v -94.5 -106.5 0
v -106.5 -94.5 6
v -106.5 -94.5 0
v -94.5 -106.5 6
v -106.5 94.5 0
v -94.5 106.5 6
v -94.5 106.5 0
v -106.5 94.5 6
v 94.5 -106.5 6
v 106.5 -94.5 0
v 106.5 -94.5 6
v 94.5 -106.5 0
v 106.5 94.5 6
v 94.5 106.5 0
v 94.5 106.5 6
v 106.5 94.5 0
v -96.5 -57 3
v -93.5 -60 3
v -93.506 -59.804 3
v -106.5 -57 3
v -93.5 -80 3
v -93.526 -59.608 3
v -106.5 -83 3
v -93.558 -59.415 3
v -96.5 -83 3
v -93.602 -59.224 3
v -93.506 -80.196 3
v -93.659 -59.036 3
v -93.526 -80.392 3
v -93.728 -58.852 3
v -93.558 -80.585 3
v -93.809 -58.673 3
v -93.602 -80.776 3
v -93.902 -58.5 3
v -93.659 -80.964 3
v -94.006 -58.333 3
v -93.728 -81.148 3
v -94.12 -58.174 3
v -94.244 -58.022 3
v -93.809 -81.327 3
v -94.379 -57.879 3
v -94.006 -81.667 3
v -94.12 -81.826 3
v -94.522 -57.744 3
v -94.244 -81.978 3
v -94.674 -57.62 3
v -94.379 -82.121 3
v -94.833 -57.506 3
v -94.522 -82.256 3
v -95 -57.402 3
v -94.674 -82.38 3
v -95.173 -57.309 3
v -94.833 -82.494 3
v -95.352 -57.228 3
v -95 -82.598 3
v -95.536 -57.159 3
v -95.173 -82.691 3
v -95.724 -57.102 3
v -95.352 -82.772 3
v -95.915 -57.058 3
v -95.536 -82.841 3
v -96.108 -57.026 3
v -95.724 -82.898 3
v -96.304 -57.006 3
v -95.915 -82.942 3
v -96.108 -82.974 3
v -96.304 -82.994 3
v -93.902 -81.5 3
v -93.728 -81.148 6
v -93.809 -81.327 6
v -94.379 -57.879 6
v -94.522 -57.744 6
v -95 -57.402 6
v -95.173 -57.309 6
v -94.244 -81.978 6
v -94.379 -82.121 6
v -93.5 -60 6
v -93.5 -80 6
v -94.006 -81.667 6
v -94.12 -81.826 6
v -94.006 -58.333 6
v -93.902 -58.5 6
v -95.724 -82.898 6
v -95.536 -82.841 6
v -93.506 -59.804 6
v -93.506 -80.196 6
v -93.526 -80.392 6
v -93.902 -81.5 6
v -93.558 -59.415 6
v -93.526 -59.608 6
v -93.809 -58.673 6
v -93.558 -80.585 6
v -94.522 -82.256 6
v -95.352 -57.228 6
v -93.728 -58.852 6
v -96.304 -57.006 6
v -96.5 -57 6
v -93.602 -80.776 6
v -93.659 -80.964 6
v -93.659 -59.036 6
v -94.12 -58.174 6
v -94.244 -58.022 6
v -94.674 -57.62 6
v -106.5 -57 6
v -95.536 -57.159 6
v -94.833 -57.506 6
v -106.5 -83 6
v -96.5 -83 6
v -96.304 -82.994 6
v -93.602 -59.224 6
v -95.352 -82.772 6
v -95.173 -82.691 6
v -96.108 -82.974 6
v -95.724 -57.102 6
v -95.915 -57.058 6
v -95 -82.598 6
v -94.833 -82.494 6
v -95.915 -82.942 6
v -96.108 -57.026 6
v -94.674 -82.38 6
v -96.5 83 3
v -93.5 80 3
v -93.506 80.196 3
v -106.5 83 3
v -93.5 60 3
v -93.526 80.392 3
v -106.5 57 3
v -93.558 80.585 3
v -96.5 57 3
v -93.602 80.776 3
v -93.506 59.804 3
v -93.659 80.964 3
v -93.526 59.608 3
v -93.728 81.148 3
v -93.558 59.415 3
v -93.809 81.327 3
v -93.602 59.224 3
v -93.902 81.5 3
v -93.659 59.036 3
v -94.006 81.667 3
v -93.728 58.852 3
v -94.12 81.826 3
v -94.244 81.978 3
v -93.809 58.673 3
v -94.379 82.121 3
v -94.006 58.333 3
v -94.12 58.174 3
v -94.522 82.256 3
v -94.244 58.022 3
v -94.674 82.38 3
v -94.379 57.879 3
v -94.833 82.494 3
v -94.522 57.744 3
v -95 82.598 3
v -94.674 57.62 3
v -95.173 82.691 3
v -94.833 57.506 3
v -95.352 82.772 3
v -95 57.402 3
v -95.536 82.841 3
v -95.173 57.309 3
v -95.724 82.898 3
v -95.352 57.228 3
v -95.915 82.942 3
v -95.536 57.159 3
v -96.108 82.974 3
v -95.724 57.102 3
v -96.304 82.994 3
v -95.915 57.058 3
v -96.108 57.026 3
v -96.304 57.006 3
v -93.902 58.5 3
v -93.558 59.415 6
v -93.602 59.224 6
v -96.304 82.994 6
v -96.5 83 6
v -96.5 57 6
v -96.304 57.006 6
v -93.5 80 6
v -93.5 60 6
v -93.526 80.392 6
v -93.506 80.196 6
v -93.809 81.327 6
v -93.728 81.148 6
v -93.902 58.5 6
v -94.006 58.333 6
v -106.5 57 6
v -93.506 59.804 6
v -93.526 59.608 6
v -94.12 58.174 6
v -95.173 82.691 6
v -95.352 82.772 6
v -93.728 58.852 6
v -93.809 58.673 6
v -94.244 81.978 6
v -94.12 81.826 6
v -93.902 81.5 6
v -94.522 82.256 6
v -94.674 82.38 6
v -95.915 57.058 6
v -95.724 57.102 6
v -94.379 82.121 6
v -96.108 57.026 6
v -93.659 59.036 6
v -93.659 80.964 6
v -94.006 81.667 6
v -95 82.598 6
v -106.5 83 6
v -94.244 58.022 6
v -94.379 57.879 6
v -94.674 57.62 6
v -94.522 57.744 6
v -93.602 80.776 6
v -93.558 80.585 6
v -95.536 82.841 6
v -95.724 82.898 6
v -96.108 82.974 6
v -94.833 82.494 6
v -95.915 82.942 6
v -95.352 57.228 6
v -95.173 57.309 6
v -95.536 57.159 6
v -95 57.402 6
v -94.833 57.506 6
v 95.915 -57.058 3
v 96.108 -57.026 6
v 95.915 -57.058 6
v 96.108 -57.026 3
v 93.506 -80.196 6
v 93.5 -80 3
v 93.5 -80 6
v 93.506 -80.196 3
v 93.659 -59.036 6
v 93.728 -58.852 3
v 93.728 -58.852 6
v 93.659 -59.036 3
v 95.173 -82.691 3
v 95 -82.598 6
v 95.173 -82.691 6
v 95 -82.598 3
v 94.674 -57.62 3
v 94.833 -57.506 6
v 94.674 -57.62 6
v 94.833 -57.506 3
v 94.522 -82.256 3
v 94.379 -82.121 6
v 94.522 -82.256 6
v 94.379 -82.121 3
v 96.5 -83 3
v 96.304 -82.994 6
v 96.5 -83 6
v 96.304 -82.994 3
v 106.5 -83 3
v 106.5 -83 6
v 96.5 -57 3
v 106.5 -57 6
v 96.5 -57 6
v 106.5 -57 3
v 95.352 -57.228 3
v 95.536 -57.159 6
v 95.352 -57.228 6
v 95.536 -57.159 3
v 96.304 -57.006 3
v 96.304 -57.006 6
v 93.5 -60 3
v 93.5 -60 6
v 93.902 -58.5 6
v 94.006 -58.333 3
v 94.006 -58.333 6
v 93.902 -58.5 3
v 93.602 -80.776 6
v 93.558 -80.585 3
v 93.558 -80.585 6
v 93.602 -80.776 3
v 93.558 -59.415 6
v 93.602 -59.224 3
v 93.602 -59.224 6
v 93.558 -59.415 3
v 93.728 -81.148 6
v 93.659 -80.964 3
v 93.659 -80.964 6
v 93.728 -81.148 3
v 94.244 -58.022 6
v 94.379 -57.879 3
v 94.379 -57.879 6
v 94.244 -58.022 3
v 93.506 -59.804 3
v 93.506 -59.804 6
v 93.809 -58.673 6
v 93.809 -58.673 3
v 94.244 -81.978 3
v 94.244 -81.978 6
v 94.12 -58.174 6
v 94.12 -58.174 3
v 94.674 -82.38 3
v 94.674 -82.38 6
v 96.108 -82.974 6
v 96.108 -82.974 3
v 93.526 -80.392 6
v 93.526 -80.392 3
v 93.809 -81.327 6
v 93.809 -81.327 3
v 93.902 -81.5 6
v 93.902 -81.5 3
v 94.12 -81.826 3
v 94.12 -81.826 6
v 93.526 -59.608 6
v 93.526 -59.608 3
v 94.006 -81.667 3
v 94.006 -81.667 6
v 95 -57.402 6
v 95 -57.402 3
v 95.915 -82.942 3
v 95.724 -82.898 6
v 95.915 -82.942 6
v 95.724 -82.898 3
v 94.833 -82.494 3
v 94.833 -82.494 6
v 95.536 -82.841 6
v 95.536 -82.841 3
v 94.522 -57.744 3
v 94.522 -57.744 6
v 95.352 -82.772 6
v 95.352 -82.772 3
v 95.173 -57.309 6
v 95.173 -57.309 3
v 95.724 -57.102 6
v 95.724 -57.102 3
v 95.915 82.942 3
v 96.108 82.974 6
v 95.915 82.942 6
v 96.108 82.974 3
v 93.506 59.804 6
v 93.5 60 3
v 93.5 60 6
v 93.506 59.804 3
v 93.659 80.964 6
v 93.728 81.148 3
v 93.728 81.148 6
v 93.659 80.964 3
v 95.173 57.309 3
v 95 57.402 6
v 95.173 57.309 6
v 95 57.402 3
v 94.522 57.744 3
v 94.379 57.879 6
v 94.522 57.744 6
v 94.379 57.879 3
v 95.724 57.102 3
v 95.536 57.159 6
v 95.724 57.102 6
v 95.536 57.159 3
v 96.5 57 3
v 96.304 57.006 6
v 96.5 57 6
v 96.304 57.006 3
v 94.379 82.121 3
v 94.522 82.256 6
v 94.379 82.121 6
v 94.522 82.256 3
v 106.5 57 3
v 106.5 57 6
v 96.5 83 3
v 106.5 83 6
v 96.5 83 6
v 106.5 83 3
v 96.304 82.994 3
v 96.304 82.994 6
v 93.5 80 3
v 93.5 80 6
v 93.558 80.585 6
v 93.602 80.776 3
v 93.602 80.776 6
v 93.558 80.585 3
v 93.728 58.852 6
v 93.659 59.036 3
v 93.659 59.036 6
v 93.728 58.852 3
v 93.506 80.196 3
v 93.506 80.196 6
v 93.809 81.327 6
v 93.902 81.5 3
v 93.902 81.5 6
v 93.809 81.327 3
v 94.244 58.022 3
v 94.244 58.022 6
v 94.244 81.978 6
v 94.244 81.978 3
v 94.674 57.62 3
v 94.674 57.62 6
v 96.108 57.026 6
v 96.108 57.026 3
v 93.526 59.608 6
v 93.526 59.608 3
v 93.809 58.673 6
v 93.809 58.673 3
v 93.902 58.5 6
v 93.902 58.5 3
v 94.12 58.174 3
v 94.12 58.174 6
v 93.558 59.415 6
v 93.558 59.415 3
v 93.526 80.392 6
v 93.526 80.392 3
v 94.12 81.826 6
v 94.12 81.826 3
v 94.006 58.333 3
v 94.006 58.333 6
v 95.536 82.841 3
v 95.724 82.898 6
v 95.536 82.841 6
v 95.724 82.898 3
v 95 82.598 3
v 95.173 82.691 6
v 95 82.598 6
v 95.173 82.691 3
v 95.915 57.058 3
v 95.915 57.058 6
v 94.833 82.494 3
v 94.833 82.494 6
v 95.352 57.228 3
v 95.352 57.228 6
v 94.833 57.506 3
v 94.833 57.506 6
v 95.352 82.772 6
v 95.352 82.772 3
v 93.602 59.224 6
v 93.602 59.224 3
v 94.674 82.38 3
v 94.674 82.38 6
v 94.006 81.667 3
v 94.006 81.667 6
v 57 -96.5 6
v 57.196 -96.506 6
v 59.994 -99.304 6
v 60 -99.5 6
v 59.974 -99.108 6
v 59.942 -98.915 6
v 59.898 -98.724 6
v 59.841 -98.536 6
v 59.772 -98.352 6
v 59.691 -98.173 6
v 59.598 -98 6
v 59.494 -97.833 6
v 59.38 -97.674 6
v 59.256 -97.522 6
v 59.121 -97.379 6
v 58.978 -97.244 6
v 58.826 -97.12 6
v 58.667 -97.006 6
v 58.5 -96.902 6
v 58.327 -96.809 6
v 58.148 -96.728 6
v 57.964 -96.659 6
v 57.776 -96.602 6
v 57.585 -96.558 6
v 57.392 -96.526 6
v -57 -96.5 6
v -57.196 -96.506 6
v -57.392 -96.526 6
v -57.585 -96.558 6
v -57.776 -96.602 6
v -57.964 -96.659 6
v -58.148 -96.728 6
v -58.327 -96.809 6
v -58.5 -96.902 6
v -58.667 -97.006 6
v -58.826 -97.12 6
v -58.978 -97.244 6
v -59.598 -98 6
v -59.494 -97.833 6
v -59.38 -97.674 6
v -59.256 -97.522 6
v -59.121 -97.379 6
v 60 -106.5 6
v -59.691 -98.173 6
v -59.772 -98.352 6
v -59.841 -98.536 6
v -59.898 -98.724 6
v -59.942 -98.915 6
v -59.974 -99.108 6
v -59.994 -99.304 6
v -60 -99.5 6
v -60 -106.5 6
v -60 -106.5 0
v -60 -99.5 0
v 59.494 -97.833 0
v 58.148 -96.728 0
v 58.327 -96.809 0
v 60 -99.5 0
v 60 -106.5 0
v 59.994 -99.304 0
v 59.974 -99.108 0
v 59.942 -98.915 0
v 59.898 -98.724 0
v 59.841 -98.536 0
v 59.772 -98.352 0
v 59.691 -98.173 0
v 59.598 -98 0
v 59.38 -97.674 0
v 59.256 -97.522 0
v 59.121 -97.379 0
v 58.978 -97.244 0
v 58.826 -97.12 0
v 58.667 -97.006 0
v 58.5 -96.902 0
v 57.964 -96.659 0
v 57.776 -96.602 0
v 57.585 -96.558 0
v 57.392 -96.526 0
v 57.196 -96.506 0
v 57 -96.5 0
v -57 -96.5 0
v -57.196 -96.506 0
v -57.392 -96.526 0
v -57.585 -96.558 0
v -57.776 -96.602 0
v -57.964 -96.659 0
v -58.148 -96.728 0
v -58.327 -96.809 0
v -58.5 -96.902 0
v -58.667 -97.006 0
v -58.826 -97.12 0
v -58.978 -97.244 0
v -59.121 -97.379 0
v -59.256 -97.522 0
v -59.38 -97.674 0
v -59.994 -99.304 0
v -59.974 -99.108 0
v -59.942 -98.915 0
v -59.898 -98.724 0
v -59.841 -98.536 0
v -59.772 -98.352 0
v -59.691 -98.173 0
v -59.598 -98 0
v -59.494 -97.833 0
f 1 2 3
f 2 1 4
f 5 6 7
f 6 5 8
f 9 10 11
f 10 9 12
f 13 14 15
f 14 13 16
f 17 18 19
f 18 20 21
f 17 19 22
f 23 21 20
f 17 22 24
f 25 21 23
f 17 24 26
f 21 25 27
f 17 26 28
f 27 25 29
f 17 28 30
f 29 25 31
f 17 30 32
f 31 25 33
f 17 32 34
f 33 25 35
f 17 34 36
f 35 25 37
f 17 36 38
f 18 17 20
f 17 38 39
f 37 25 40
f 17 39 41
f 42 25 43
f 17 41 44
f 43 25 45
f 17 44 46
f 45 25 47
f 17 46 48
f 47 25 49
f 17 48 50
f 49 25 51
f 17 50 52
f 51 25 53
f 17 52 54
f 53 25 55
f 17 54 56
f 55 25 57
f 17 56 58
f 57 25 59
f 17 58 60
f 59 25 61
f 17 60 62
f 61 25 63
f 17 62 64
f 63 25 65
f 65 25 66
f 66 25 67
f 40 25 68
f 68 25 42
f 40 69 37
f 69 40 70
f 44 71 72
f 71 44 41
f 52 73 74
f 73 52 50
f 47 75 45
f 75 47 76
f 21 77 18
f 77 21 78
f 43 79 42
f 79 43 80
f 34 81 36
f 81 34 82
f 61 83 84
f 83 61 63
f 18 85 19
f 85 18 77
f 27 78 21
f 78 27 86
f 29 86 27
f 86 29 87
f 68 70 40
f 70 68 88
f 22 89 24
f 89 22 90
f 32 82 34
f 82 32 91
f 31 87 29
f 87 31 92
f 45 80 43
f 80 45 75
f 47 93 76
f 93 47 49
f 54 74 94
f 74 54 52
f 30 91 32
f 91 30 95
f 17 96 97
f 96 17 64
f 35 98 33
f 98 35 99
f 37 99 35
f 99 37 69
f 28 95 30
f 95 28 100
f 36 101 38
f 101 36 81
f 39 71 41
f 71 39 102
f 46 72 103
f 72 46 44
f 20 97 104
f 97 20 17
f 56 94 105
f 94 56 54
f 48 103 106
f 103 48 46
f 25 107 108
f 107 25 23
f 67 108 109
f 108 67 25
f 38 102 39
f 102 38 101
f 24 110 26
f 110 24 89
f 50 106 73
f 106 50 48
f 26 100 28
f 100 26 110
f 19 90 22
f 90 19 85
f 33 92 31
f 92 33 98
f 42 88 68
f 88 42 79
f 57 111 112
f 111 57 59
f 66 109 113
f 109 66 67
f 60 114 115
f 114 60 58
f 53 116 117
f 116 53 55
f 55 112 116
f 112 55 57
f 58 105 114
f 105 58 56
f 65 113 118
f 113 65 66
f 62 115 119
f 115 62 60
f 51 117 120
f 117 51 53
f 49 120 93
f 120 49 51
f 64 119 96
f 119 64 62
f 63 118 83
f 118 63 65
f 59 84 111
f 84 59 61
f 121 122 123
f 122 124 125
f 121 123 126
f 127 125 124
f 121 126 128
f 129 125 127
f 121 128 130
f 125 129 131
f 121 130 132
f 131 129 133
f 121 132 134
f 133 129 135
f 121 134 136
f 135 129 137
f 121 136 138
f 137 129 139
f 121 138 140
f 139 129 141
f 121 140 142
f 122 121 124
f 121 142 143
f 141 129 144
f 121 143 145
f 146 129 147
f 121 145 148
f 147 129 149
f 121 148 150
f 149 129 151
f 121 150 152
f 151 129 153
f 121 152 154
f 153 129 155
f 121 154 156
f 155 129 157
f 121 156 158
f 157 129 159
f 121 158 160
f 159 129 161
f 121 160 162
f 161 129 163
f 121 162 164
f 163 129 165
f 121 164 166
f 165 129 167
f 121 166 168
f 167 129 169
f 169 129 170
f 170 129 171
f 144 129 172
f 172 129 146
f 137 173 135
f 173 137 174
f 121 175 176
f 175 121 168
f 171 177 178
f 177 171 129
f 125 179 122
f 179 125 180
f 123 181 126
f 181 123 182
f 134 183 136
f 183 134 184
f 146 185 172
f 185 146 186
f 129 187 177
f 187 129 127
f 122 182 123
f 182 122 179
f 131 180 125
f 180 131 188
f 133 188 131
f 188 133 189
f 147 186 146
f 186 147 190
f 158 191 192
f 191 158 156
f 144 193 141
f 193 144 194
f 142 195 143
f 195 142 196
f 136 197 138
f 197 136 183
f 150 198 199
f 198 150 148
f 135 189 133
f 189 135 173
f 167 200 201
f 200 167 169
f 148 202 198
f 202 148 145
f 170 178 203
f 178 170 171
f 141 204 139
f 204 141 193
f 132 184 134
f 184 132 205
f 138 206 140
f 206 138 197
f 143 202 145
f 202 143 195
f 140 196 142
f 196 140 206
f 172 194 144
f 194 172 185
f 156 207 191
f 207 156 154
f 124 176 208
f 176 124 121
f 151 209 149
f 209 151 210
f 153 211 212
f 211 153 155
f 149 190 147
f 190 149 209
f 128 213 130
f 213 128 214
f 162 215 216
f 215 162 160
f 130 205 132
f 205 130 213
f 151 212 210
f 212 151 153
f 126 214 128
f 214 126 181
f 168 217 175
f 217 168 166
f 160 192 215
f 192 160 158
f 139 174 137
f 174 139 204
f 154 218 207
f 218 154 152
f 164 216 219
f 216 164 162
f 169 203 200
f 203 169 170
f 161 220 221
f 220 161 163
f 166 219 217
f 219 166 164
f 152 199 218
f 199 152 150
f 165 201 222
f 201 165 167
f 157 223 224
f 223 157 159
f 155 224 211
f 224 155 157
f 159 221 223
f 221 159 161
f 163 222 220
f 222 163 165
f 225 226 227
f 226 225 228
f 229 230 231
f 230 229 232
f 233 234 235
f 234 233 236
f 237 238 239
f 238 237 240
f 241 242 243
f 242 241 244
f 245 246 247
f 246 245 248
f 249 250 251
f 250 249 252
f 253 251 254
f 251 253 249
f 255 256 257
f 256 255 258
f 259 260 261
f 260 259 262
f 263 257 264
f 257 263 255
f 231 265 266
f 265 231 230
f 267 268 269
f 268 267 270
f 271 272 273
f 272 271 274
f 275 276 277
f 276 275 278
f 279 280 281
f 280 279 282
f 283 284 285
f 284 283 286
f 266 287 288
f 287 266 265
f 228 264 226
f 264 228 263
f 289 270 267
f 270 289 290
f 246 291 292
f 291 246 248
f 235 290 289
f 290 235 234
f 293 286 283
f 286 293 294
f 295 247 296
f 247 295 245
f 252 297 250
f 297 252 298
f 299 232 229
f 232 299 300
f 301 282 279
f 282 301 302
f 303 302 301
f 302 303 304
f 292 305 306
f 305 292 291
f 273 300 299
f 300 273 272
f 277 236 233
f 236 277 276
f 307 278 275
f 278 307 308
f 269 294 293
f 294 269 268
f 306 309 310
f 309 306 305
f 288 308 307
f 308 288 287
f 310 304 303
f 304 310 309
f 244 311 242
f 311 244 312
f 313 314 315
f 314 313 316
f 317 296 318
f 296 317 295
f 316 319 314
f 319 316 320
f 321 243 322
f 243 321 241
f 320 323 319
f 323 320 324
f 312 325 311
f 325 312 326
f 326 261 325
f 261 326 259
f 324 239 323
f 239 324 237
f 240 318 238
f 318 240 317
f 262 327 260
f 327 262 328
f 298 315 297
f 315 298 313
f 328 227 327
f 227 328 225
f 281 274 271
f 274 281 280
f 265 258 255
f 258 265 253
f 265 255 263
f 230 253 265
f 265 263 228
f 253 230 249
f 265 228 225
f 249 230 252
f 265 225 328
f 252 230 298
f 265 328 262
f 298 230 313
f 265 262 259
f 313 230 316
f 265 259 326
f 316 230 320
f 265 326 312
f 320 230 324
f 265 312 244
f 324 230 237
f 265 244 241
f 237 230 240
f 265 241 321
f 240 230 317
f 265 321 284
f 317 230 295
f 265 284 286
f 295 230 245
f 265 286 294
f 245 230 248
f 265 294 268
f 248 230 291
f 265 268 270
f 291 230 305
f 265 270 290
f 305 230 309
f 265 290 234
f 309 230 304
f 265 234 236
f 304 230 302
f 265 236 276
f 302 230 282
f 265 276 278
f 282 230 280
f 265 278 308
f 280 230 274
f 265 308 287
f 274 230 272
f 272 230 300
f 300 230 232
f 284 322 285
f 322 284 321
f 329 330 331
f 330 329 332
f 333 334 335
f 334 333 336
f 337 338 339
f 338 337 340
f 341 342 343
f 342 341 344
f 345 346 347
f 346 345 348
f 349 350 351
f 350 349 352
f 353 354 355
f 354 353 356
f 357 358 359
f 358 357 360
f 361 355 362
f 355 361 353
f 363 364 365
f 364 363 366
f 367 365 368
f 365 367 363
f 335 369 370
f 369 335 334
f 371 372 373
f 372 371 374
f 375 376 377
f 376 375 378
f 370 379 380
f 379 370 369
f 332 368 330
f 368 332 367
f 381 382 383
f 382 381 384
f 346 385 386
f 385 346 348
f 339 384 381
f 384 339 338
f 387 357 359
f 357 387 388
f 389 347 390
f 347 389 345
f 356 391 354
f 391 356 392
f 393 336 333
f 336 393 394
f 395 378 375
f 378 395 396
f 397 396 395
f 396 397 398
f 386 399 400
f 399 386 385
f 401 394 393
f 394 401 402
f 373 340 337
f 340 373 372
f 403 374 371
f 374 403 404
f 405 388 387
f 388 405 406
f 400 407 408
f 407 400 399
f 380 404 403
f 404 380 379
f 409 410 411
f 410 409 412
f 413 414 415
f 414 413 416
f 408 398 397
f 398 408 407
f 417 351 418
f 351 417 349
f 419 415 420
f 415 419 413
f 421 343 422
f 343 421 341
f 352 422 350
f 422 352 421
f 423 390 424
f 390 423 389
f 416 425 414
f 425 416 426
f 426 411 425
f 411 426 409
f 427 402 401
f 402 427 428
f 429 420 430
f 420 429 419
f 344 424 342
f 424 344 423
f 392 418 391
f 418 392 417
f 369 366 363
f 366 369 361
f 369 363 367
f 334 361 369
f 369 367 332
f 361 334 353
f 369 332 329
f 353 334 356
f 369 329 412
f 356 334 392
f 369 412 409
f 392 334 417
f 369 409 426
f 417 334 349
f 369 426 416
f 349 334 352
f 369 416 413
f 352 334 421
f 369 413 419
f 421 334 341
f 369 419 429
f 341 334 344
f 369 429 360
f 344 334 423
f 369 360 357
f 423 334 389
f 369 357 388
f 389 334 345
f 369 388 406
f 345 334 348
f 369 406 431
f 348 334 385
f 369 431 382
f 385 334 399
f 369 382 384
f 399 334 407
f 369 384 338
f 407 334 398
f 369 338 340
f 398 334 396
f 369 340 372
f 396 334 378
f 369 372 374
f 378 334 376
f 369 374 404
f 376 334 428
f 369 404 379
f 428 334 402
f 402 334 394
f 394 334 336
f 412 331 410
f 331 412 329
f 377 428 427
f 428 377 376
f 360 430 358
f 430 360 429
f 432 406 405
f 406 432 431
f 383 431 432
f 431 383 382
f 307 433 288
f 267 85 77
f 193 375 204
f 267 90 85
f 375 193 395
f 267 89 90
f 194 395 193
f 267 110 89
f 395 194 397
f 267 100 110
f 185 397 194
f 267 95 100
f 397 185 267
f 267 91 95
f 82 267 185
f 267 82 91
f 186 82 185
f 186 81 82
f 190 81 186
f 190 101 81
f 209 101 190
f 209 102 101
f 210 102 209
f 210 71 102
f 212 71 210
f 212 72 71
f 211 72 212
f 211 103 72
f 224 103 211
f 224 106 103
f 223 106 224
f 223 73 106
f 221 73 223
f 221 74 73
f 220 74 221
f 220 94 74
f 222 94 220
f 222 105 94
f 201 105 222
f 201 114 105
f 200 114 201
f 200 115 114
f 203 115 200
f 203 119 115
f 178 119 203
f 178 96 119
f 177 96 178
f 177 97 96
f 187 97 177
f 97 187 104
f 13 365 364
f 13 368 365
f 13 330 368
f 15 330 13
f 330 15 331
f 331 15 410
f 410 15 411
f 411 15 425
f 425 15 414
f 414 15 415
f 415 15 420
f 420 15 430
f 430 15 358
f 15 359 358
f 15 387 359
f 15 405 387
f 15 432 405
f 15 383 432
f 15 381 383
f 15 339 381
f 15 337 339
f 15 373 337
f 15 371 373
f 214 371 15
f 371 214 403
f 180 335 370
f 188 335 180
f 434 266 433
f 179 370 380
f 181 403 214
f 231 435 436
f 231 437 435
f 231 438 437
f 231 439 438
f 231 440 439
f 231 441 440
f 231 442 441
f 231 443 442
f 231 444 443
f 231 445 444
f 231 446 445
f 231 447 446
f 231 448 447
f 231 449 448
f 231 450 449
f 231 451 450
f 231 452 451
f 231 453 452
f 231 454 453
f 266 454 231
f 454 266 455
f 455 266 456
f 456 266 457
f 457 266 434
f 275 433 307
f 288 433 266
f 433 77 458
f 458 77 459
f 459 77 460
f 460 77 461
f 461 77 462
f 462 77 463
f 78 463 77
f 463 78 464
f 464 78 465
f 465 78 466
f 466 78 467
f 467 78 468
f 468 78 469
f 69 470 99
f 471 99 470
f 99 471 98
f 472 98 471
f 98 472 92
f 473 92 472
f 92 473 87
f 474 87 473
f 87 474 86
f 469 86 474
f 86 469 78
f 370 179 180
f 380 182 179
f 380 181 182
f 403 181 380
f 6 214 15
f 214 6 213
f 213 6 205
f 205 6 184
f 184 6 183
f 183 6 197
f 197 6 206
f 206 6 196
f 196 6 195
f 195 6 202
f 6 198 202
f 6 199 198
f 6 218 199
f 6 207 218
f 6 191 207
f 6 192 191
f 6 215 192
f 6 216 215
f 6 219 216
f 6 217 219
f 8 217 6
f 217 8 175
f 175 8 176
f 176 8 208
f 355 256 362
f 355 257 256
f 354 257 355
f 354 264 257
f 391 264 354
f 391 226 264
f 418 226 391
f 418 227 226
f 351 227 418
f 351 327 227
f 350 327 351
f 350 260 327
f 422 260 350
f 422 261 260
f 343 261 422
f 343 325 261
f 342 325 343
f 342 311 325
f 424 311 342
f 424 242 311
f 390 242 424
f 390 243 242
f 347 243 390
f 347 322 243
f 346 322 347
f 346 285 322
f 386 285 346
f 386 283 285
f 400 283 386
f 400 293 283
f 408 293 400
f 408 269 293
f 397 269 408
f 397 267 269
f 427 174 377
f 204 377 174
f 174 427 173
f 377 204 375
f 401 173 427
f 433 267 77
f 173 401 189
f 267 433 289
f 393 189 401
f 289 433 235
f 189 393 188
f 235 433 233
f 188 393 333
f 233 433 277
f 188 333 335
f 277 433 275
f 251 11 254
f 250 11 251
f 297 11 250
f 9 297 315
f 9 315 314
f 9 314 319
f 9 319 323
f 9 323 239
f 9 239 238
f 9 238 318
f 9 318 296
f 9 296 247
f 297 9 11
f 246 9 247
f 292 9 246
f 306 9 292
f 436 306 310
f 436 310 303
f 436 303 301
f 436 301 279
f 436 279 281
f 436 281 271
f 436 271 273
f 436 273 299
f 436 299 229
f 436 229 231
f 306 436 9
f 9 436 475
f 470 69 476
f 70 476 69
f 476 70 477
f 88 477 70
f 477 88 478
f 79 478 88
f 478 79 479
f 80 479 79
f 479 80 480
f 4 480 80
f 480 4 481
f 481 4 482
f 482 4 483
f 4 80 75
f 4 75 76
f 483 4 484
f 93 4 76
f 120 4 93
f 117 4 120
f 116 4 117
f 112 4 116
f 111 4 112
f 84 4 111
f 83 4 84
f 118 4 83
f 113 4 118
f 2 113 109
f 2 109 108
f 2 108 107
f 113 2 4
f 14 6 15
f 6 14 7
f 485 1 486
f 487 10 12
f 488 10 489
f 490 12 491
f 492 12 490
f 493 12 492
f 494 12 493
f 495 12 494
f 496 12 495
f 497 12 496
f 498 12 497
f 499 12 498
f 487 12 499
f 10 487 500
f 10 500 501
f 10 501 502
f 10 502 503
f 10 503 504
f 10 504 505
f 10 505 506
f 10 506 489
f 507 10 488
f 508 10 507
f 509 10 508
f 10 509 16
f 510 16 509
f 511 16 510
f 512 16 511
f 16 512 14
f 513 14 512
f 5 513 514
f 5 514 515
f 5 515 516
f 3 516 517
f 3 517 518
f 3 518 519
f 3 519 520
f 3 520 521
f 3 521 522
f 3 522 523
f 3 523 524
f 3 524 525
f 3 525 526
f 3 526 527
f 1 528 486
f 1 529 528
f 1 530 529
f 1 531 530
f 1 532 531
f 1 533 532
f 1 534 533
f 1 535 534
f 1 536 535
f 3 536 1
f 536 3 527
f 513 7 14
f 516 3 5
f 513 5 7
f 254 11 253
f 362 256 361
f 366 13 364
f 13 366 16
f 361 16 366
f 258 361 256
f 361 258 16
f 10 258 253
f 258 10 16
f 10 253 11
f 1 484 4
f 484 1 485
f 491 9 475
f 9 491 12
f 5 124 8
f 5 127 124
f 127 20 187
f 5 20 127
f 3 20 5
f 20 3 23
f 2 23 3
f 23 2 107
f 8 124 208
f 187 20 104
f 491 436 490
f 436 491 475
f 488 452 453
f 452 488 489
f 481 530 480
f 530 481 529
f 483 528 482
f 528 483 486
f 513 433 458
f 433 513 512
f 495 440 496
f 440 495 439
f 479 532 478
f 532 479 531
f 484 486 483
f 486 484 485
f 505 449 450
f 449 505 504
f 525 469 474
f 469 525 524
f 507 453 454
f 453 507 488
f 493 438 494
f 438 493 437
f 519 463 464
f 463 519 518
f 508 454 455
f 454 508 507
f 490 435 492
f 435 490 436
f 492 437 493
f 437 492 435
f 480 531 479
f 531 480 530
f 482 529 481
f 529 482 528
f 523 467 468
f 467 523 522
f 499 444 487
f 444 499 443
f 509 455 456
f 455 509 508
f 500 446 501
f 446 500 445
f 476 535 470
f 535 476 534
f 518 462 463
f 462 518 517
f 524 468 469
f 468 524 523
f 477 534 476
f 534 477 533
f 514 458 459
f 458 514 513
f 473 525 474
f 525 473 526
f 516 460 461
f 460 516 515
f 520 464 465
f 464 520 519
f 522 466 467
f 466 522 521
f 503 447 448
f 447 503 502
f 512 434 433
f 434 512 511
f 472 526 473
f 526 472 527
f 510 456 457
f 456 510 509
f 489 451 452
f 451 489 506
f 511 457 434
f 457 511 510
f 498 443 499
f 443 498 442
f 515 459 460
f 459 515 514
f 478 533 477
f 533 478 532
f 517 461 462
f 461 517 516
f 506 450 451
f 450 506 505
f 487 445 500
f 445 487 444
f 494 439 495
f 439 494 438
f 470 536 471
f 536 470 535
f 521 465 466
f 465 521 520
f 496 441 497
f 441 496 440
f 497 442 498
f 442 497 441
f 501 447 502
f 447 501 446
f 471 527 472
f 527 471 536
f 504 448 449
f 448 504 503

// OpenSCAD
// file: ../OpenSCAD_Modules/cube_vround.scad
module cube_vround(
	size=[10,10,10],
	round_corners=[true,true,true,true],
	rounding=3,
	center_xy=false,
	center_z=false,
	attach=0,
	wall_attach=0,
	quality=2, //integer from 1 to infinity
)
{
	assert(len(size)==3);
	assert(len(round_corners)==4);
	assert(rounding>0);
	assert(rounding<=size[0]/2);
	assert(rounding<=size[1]/2);
	assert(quality>0);
	assert(attach>=0);
	assert(wall_attach>=0);
	height=size[2]+attach;
	cyl_r=rounding+wall_attach;
	cyl_mvx=size[0]/2-rounding;
	cyl_mvy=size[1]/2-rounding;
	cube_szx=size[0]/2;
	cube_szy=size[1]/2;
	cube_mvx=cube_szx/2+wall_attach;
	cube_mvy=cube_szy/2+wall_attach;
	translate([center_xy?0:cube_szx,center_xy?0:cube_szy,center_z?-attach/2:(size[2]-attach)/2])
		hull()
		{
			if(round_corners[0])
				translate([cyl_mvx,cyl_mvy])
					cylinder(r=cyl_r,h=height,$fn=12*quality,center=true);
			else
				translate([cube_mvx,cube_mvy])
					cube([cube_szx,cube_szy,height],center=true);
			if(round_corners[1])
				translate([cyl_mvx,-cyl_mvy])
					cylinder(r=cyl_r,h=height,$fn=12*quality,center=true);
			else
				translate([cube_mvx,-cube_mvy])
					cube([cube_szx,cube_szy,height],center=true);
			if(round_corners[2])
				translate([-cyl_mvx,-cyl_mvy])
					cylinder(r=cyl_r,h=height,$fn=12*quality,center=true);
			else
				translate([-cube_mvx,-cube_mvy])
					cube([cube_szx,cube_szy,height],center=true);
			if(round_corners[3])
				translate([-cyl_mvx,cyl_mvy])
					cylinder(r=cyl_r,h=height,$fn=12*quality,center=true);
			else
				translate([-cube_mvx,cube_mvy])
					cube([cube_szx,cube_szy,height],center=true);
		};
}

//example
cube_vround(round_corners=[true,false,true,false],
size=[10,20,6],
attach=0.1,
wall_attach=0.1,
rounding=3,
center_xy=true,center_z=false);
// main file
use <../OpenSCAD_Modules/cube_vround.scad>

module plate
(
	size=[213,213,6],
	outer_cut_sz=12,
	clip_cut_sz=[13,20,3],
	clip_shift=140,
	clip_rounding=3,
	wire_clip_sz=[120,10],
	quality=8,
)
{
	cutClr=1;
	difference()
	{
		//base
		cube_vround(
			size=size,
			round_corners=[false,false,false,false],
			center_xy=true,quality=quality
		);
		//corner cuts
		for(i=[-1:2:1],j=[-1:2:1])
		translate([size[0]/2*i,size[1]/2*j,-cutClr])
		rotate(v=[0,0,1],a=
			(i>0&&j>0)?180:
			(i<0&&j<0)?0:
			(i>0&&j<0)?90:270)
		linear_extrude(height=size[2]+2*cutClr)
		polygon(points=[
			[-cutClr,-cutClr],
			[-cutClr,outer_cut_sz],
			[0,outer_cut_sz],
			[outer_cut_sz,0],
			[outer_cut_sz,-cutClr]]);
		//side clip cuts
		for(i=[-1:2:1],j=[-1:2:1])
		translate(
			[i*(size[0]/2-clip_cut_sz[0]/2+cutClr/2),
			j*clip_shift/2,
			size[2]-clip_cut_sz[2]])
		cube_vround(
			size=[clip_cut_sz[0]+cutClr,clip_cut_sz[1]+clip_rounding*2,clip_cut_sz[2]+cutClr],
			round_corners=[i<0,i<0,i>0,i>0],
			rounding=clip_rounding,
			center_xy=true,
			quality=quality
		);
		//bottom cut
		translate([0,-size[1]/2+wire_clip_sz[1]/2-cutClr/2,-cutClr])
		cube_vround(
			size=[wire_clip_sz[0],wire_clip_sz[1]+cutClr,size[2]+cutClr*2],
			round_corners=[true,false,false,true],
			rounding=clip_rounding,
			center_xy=true,
			quality=quality
		);
	}

}

plate();
